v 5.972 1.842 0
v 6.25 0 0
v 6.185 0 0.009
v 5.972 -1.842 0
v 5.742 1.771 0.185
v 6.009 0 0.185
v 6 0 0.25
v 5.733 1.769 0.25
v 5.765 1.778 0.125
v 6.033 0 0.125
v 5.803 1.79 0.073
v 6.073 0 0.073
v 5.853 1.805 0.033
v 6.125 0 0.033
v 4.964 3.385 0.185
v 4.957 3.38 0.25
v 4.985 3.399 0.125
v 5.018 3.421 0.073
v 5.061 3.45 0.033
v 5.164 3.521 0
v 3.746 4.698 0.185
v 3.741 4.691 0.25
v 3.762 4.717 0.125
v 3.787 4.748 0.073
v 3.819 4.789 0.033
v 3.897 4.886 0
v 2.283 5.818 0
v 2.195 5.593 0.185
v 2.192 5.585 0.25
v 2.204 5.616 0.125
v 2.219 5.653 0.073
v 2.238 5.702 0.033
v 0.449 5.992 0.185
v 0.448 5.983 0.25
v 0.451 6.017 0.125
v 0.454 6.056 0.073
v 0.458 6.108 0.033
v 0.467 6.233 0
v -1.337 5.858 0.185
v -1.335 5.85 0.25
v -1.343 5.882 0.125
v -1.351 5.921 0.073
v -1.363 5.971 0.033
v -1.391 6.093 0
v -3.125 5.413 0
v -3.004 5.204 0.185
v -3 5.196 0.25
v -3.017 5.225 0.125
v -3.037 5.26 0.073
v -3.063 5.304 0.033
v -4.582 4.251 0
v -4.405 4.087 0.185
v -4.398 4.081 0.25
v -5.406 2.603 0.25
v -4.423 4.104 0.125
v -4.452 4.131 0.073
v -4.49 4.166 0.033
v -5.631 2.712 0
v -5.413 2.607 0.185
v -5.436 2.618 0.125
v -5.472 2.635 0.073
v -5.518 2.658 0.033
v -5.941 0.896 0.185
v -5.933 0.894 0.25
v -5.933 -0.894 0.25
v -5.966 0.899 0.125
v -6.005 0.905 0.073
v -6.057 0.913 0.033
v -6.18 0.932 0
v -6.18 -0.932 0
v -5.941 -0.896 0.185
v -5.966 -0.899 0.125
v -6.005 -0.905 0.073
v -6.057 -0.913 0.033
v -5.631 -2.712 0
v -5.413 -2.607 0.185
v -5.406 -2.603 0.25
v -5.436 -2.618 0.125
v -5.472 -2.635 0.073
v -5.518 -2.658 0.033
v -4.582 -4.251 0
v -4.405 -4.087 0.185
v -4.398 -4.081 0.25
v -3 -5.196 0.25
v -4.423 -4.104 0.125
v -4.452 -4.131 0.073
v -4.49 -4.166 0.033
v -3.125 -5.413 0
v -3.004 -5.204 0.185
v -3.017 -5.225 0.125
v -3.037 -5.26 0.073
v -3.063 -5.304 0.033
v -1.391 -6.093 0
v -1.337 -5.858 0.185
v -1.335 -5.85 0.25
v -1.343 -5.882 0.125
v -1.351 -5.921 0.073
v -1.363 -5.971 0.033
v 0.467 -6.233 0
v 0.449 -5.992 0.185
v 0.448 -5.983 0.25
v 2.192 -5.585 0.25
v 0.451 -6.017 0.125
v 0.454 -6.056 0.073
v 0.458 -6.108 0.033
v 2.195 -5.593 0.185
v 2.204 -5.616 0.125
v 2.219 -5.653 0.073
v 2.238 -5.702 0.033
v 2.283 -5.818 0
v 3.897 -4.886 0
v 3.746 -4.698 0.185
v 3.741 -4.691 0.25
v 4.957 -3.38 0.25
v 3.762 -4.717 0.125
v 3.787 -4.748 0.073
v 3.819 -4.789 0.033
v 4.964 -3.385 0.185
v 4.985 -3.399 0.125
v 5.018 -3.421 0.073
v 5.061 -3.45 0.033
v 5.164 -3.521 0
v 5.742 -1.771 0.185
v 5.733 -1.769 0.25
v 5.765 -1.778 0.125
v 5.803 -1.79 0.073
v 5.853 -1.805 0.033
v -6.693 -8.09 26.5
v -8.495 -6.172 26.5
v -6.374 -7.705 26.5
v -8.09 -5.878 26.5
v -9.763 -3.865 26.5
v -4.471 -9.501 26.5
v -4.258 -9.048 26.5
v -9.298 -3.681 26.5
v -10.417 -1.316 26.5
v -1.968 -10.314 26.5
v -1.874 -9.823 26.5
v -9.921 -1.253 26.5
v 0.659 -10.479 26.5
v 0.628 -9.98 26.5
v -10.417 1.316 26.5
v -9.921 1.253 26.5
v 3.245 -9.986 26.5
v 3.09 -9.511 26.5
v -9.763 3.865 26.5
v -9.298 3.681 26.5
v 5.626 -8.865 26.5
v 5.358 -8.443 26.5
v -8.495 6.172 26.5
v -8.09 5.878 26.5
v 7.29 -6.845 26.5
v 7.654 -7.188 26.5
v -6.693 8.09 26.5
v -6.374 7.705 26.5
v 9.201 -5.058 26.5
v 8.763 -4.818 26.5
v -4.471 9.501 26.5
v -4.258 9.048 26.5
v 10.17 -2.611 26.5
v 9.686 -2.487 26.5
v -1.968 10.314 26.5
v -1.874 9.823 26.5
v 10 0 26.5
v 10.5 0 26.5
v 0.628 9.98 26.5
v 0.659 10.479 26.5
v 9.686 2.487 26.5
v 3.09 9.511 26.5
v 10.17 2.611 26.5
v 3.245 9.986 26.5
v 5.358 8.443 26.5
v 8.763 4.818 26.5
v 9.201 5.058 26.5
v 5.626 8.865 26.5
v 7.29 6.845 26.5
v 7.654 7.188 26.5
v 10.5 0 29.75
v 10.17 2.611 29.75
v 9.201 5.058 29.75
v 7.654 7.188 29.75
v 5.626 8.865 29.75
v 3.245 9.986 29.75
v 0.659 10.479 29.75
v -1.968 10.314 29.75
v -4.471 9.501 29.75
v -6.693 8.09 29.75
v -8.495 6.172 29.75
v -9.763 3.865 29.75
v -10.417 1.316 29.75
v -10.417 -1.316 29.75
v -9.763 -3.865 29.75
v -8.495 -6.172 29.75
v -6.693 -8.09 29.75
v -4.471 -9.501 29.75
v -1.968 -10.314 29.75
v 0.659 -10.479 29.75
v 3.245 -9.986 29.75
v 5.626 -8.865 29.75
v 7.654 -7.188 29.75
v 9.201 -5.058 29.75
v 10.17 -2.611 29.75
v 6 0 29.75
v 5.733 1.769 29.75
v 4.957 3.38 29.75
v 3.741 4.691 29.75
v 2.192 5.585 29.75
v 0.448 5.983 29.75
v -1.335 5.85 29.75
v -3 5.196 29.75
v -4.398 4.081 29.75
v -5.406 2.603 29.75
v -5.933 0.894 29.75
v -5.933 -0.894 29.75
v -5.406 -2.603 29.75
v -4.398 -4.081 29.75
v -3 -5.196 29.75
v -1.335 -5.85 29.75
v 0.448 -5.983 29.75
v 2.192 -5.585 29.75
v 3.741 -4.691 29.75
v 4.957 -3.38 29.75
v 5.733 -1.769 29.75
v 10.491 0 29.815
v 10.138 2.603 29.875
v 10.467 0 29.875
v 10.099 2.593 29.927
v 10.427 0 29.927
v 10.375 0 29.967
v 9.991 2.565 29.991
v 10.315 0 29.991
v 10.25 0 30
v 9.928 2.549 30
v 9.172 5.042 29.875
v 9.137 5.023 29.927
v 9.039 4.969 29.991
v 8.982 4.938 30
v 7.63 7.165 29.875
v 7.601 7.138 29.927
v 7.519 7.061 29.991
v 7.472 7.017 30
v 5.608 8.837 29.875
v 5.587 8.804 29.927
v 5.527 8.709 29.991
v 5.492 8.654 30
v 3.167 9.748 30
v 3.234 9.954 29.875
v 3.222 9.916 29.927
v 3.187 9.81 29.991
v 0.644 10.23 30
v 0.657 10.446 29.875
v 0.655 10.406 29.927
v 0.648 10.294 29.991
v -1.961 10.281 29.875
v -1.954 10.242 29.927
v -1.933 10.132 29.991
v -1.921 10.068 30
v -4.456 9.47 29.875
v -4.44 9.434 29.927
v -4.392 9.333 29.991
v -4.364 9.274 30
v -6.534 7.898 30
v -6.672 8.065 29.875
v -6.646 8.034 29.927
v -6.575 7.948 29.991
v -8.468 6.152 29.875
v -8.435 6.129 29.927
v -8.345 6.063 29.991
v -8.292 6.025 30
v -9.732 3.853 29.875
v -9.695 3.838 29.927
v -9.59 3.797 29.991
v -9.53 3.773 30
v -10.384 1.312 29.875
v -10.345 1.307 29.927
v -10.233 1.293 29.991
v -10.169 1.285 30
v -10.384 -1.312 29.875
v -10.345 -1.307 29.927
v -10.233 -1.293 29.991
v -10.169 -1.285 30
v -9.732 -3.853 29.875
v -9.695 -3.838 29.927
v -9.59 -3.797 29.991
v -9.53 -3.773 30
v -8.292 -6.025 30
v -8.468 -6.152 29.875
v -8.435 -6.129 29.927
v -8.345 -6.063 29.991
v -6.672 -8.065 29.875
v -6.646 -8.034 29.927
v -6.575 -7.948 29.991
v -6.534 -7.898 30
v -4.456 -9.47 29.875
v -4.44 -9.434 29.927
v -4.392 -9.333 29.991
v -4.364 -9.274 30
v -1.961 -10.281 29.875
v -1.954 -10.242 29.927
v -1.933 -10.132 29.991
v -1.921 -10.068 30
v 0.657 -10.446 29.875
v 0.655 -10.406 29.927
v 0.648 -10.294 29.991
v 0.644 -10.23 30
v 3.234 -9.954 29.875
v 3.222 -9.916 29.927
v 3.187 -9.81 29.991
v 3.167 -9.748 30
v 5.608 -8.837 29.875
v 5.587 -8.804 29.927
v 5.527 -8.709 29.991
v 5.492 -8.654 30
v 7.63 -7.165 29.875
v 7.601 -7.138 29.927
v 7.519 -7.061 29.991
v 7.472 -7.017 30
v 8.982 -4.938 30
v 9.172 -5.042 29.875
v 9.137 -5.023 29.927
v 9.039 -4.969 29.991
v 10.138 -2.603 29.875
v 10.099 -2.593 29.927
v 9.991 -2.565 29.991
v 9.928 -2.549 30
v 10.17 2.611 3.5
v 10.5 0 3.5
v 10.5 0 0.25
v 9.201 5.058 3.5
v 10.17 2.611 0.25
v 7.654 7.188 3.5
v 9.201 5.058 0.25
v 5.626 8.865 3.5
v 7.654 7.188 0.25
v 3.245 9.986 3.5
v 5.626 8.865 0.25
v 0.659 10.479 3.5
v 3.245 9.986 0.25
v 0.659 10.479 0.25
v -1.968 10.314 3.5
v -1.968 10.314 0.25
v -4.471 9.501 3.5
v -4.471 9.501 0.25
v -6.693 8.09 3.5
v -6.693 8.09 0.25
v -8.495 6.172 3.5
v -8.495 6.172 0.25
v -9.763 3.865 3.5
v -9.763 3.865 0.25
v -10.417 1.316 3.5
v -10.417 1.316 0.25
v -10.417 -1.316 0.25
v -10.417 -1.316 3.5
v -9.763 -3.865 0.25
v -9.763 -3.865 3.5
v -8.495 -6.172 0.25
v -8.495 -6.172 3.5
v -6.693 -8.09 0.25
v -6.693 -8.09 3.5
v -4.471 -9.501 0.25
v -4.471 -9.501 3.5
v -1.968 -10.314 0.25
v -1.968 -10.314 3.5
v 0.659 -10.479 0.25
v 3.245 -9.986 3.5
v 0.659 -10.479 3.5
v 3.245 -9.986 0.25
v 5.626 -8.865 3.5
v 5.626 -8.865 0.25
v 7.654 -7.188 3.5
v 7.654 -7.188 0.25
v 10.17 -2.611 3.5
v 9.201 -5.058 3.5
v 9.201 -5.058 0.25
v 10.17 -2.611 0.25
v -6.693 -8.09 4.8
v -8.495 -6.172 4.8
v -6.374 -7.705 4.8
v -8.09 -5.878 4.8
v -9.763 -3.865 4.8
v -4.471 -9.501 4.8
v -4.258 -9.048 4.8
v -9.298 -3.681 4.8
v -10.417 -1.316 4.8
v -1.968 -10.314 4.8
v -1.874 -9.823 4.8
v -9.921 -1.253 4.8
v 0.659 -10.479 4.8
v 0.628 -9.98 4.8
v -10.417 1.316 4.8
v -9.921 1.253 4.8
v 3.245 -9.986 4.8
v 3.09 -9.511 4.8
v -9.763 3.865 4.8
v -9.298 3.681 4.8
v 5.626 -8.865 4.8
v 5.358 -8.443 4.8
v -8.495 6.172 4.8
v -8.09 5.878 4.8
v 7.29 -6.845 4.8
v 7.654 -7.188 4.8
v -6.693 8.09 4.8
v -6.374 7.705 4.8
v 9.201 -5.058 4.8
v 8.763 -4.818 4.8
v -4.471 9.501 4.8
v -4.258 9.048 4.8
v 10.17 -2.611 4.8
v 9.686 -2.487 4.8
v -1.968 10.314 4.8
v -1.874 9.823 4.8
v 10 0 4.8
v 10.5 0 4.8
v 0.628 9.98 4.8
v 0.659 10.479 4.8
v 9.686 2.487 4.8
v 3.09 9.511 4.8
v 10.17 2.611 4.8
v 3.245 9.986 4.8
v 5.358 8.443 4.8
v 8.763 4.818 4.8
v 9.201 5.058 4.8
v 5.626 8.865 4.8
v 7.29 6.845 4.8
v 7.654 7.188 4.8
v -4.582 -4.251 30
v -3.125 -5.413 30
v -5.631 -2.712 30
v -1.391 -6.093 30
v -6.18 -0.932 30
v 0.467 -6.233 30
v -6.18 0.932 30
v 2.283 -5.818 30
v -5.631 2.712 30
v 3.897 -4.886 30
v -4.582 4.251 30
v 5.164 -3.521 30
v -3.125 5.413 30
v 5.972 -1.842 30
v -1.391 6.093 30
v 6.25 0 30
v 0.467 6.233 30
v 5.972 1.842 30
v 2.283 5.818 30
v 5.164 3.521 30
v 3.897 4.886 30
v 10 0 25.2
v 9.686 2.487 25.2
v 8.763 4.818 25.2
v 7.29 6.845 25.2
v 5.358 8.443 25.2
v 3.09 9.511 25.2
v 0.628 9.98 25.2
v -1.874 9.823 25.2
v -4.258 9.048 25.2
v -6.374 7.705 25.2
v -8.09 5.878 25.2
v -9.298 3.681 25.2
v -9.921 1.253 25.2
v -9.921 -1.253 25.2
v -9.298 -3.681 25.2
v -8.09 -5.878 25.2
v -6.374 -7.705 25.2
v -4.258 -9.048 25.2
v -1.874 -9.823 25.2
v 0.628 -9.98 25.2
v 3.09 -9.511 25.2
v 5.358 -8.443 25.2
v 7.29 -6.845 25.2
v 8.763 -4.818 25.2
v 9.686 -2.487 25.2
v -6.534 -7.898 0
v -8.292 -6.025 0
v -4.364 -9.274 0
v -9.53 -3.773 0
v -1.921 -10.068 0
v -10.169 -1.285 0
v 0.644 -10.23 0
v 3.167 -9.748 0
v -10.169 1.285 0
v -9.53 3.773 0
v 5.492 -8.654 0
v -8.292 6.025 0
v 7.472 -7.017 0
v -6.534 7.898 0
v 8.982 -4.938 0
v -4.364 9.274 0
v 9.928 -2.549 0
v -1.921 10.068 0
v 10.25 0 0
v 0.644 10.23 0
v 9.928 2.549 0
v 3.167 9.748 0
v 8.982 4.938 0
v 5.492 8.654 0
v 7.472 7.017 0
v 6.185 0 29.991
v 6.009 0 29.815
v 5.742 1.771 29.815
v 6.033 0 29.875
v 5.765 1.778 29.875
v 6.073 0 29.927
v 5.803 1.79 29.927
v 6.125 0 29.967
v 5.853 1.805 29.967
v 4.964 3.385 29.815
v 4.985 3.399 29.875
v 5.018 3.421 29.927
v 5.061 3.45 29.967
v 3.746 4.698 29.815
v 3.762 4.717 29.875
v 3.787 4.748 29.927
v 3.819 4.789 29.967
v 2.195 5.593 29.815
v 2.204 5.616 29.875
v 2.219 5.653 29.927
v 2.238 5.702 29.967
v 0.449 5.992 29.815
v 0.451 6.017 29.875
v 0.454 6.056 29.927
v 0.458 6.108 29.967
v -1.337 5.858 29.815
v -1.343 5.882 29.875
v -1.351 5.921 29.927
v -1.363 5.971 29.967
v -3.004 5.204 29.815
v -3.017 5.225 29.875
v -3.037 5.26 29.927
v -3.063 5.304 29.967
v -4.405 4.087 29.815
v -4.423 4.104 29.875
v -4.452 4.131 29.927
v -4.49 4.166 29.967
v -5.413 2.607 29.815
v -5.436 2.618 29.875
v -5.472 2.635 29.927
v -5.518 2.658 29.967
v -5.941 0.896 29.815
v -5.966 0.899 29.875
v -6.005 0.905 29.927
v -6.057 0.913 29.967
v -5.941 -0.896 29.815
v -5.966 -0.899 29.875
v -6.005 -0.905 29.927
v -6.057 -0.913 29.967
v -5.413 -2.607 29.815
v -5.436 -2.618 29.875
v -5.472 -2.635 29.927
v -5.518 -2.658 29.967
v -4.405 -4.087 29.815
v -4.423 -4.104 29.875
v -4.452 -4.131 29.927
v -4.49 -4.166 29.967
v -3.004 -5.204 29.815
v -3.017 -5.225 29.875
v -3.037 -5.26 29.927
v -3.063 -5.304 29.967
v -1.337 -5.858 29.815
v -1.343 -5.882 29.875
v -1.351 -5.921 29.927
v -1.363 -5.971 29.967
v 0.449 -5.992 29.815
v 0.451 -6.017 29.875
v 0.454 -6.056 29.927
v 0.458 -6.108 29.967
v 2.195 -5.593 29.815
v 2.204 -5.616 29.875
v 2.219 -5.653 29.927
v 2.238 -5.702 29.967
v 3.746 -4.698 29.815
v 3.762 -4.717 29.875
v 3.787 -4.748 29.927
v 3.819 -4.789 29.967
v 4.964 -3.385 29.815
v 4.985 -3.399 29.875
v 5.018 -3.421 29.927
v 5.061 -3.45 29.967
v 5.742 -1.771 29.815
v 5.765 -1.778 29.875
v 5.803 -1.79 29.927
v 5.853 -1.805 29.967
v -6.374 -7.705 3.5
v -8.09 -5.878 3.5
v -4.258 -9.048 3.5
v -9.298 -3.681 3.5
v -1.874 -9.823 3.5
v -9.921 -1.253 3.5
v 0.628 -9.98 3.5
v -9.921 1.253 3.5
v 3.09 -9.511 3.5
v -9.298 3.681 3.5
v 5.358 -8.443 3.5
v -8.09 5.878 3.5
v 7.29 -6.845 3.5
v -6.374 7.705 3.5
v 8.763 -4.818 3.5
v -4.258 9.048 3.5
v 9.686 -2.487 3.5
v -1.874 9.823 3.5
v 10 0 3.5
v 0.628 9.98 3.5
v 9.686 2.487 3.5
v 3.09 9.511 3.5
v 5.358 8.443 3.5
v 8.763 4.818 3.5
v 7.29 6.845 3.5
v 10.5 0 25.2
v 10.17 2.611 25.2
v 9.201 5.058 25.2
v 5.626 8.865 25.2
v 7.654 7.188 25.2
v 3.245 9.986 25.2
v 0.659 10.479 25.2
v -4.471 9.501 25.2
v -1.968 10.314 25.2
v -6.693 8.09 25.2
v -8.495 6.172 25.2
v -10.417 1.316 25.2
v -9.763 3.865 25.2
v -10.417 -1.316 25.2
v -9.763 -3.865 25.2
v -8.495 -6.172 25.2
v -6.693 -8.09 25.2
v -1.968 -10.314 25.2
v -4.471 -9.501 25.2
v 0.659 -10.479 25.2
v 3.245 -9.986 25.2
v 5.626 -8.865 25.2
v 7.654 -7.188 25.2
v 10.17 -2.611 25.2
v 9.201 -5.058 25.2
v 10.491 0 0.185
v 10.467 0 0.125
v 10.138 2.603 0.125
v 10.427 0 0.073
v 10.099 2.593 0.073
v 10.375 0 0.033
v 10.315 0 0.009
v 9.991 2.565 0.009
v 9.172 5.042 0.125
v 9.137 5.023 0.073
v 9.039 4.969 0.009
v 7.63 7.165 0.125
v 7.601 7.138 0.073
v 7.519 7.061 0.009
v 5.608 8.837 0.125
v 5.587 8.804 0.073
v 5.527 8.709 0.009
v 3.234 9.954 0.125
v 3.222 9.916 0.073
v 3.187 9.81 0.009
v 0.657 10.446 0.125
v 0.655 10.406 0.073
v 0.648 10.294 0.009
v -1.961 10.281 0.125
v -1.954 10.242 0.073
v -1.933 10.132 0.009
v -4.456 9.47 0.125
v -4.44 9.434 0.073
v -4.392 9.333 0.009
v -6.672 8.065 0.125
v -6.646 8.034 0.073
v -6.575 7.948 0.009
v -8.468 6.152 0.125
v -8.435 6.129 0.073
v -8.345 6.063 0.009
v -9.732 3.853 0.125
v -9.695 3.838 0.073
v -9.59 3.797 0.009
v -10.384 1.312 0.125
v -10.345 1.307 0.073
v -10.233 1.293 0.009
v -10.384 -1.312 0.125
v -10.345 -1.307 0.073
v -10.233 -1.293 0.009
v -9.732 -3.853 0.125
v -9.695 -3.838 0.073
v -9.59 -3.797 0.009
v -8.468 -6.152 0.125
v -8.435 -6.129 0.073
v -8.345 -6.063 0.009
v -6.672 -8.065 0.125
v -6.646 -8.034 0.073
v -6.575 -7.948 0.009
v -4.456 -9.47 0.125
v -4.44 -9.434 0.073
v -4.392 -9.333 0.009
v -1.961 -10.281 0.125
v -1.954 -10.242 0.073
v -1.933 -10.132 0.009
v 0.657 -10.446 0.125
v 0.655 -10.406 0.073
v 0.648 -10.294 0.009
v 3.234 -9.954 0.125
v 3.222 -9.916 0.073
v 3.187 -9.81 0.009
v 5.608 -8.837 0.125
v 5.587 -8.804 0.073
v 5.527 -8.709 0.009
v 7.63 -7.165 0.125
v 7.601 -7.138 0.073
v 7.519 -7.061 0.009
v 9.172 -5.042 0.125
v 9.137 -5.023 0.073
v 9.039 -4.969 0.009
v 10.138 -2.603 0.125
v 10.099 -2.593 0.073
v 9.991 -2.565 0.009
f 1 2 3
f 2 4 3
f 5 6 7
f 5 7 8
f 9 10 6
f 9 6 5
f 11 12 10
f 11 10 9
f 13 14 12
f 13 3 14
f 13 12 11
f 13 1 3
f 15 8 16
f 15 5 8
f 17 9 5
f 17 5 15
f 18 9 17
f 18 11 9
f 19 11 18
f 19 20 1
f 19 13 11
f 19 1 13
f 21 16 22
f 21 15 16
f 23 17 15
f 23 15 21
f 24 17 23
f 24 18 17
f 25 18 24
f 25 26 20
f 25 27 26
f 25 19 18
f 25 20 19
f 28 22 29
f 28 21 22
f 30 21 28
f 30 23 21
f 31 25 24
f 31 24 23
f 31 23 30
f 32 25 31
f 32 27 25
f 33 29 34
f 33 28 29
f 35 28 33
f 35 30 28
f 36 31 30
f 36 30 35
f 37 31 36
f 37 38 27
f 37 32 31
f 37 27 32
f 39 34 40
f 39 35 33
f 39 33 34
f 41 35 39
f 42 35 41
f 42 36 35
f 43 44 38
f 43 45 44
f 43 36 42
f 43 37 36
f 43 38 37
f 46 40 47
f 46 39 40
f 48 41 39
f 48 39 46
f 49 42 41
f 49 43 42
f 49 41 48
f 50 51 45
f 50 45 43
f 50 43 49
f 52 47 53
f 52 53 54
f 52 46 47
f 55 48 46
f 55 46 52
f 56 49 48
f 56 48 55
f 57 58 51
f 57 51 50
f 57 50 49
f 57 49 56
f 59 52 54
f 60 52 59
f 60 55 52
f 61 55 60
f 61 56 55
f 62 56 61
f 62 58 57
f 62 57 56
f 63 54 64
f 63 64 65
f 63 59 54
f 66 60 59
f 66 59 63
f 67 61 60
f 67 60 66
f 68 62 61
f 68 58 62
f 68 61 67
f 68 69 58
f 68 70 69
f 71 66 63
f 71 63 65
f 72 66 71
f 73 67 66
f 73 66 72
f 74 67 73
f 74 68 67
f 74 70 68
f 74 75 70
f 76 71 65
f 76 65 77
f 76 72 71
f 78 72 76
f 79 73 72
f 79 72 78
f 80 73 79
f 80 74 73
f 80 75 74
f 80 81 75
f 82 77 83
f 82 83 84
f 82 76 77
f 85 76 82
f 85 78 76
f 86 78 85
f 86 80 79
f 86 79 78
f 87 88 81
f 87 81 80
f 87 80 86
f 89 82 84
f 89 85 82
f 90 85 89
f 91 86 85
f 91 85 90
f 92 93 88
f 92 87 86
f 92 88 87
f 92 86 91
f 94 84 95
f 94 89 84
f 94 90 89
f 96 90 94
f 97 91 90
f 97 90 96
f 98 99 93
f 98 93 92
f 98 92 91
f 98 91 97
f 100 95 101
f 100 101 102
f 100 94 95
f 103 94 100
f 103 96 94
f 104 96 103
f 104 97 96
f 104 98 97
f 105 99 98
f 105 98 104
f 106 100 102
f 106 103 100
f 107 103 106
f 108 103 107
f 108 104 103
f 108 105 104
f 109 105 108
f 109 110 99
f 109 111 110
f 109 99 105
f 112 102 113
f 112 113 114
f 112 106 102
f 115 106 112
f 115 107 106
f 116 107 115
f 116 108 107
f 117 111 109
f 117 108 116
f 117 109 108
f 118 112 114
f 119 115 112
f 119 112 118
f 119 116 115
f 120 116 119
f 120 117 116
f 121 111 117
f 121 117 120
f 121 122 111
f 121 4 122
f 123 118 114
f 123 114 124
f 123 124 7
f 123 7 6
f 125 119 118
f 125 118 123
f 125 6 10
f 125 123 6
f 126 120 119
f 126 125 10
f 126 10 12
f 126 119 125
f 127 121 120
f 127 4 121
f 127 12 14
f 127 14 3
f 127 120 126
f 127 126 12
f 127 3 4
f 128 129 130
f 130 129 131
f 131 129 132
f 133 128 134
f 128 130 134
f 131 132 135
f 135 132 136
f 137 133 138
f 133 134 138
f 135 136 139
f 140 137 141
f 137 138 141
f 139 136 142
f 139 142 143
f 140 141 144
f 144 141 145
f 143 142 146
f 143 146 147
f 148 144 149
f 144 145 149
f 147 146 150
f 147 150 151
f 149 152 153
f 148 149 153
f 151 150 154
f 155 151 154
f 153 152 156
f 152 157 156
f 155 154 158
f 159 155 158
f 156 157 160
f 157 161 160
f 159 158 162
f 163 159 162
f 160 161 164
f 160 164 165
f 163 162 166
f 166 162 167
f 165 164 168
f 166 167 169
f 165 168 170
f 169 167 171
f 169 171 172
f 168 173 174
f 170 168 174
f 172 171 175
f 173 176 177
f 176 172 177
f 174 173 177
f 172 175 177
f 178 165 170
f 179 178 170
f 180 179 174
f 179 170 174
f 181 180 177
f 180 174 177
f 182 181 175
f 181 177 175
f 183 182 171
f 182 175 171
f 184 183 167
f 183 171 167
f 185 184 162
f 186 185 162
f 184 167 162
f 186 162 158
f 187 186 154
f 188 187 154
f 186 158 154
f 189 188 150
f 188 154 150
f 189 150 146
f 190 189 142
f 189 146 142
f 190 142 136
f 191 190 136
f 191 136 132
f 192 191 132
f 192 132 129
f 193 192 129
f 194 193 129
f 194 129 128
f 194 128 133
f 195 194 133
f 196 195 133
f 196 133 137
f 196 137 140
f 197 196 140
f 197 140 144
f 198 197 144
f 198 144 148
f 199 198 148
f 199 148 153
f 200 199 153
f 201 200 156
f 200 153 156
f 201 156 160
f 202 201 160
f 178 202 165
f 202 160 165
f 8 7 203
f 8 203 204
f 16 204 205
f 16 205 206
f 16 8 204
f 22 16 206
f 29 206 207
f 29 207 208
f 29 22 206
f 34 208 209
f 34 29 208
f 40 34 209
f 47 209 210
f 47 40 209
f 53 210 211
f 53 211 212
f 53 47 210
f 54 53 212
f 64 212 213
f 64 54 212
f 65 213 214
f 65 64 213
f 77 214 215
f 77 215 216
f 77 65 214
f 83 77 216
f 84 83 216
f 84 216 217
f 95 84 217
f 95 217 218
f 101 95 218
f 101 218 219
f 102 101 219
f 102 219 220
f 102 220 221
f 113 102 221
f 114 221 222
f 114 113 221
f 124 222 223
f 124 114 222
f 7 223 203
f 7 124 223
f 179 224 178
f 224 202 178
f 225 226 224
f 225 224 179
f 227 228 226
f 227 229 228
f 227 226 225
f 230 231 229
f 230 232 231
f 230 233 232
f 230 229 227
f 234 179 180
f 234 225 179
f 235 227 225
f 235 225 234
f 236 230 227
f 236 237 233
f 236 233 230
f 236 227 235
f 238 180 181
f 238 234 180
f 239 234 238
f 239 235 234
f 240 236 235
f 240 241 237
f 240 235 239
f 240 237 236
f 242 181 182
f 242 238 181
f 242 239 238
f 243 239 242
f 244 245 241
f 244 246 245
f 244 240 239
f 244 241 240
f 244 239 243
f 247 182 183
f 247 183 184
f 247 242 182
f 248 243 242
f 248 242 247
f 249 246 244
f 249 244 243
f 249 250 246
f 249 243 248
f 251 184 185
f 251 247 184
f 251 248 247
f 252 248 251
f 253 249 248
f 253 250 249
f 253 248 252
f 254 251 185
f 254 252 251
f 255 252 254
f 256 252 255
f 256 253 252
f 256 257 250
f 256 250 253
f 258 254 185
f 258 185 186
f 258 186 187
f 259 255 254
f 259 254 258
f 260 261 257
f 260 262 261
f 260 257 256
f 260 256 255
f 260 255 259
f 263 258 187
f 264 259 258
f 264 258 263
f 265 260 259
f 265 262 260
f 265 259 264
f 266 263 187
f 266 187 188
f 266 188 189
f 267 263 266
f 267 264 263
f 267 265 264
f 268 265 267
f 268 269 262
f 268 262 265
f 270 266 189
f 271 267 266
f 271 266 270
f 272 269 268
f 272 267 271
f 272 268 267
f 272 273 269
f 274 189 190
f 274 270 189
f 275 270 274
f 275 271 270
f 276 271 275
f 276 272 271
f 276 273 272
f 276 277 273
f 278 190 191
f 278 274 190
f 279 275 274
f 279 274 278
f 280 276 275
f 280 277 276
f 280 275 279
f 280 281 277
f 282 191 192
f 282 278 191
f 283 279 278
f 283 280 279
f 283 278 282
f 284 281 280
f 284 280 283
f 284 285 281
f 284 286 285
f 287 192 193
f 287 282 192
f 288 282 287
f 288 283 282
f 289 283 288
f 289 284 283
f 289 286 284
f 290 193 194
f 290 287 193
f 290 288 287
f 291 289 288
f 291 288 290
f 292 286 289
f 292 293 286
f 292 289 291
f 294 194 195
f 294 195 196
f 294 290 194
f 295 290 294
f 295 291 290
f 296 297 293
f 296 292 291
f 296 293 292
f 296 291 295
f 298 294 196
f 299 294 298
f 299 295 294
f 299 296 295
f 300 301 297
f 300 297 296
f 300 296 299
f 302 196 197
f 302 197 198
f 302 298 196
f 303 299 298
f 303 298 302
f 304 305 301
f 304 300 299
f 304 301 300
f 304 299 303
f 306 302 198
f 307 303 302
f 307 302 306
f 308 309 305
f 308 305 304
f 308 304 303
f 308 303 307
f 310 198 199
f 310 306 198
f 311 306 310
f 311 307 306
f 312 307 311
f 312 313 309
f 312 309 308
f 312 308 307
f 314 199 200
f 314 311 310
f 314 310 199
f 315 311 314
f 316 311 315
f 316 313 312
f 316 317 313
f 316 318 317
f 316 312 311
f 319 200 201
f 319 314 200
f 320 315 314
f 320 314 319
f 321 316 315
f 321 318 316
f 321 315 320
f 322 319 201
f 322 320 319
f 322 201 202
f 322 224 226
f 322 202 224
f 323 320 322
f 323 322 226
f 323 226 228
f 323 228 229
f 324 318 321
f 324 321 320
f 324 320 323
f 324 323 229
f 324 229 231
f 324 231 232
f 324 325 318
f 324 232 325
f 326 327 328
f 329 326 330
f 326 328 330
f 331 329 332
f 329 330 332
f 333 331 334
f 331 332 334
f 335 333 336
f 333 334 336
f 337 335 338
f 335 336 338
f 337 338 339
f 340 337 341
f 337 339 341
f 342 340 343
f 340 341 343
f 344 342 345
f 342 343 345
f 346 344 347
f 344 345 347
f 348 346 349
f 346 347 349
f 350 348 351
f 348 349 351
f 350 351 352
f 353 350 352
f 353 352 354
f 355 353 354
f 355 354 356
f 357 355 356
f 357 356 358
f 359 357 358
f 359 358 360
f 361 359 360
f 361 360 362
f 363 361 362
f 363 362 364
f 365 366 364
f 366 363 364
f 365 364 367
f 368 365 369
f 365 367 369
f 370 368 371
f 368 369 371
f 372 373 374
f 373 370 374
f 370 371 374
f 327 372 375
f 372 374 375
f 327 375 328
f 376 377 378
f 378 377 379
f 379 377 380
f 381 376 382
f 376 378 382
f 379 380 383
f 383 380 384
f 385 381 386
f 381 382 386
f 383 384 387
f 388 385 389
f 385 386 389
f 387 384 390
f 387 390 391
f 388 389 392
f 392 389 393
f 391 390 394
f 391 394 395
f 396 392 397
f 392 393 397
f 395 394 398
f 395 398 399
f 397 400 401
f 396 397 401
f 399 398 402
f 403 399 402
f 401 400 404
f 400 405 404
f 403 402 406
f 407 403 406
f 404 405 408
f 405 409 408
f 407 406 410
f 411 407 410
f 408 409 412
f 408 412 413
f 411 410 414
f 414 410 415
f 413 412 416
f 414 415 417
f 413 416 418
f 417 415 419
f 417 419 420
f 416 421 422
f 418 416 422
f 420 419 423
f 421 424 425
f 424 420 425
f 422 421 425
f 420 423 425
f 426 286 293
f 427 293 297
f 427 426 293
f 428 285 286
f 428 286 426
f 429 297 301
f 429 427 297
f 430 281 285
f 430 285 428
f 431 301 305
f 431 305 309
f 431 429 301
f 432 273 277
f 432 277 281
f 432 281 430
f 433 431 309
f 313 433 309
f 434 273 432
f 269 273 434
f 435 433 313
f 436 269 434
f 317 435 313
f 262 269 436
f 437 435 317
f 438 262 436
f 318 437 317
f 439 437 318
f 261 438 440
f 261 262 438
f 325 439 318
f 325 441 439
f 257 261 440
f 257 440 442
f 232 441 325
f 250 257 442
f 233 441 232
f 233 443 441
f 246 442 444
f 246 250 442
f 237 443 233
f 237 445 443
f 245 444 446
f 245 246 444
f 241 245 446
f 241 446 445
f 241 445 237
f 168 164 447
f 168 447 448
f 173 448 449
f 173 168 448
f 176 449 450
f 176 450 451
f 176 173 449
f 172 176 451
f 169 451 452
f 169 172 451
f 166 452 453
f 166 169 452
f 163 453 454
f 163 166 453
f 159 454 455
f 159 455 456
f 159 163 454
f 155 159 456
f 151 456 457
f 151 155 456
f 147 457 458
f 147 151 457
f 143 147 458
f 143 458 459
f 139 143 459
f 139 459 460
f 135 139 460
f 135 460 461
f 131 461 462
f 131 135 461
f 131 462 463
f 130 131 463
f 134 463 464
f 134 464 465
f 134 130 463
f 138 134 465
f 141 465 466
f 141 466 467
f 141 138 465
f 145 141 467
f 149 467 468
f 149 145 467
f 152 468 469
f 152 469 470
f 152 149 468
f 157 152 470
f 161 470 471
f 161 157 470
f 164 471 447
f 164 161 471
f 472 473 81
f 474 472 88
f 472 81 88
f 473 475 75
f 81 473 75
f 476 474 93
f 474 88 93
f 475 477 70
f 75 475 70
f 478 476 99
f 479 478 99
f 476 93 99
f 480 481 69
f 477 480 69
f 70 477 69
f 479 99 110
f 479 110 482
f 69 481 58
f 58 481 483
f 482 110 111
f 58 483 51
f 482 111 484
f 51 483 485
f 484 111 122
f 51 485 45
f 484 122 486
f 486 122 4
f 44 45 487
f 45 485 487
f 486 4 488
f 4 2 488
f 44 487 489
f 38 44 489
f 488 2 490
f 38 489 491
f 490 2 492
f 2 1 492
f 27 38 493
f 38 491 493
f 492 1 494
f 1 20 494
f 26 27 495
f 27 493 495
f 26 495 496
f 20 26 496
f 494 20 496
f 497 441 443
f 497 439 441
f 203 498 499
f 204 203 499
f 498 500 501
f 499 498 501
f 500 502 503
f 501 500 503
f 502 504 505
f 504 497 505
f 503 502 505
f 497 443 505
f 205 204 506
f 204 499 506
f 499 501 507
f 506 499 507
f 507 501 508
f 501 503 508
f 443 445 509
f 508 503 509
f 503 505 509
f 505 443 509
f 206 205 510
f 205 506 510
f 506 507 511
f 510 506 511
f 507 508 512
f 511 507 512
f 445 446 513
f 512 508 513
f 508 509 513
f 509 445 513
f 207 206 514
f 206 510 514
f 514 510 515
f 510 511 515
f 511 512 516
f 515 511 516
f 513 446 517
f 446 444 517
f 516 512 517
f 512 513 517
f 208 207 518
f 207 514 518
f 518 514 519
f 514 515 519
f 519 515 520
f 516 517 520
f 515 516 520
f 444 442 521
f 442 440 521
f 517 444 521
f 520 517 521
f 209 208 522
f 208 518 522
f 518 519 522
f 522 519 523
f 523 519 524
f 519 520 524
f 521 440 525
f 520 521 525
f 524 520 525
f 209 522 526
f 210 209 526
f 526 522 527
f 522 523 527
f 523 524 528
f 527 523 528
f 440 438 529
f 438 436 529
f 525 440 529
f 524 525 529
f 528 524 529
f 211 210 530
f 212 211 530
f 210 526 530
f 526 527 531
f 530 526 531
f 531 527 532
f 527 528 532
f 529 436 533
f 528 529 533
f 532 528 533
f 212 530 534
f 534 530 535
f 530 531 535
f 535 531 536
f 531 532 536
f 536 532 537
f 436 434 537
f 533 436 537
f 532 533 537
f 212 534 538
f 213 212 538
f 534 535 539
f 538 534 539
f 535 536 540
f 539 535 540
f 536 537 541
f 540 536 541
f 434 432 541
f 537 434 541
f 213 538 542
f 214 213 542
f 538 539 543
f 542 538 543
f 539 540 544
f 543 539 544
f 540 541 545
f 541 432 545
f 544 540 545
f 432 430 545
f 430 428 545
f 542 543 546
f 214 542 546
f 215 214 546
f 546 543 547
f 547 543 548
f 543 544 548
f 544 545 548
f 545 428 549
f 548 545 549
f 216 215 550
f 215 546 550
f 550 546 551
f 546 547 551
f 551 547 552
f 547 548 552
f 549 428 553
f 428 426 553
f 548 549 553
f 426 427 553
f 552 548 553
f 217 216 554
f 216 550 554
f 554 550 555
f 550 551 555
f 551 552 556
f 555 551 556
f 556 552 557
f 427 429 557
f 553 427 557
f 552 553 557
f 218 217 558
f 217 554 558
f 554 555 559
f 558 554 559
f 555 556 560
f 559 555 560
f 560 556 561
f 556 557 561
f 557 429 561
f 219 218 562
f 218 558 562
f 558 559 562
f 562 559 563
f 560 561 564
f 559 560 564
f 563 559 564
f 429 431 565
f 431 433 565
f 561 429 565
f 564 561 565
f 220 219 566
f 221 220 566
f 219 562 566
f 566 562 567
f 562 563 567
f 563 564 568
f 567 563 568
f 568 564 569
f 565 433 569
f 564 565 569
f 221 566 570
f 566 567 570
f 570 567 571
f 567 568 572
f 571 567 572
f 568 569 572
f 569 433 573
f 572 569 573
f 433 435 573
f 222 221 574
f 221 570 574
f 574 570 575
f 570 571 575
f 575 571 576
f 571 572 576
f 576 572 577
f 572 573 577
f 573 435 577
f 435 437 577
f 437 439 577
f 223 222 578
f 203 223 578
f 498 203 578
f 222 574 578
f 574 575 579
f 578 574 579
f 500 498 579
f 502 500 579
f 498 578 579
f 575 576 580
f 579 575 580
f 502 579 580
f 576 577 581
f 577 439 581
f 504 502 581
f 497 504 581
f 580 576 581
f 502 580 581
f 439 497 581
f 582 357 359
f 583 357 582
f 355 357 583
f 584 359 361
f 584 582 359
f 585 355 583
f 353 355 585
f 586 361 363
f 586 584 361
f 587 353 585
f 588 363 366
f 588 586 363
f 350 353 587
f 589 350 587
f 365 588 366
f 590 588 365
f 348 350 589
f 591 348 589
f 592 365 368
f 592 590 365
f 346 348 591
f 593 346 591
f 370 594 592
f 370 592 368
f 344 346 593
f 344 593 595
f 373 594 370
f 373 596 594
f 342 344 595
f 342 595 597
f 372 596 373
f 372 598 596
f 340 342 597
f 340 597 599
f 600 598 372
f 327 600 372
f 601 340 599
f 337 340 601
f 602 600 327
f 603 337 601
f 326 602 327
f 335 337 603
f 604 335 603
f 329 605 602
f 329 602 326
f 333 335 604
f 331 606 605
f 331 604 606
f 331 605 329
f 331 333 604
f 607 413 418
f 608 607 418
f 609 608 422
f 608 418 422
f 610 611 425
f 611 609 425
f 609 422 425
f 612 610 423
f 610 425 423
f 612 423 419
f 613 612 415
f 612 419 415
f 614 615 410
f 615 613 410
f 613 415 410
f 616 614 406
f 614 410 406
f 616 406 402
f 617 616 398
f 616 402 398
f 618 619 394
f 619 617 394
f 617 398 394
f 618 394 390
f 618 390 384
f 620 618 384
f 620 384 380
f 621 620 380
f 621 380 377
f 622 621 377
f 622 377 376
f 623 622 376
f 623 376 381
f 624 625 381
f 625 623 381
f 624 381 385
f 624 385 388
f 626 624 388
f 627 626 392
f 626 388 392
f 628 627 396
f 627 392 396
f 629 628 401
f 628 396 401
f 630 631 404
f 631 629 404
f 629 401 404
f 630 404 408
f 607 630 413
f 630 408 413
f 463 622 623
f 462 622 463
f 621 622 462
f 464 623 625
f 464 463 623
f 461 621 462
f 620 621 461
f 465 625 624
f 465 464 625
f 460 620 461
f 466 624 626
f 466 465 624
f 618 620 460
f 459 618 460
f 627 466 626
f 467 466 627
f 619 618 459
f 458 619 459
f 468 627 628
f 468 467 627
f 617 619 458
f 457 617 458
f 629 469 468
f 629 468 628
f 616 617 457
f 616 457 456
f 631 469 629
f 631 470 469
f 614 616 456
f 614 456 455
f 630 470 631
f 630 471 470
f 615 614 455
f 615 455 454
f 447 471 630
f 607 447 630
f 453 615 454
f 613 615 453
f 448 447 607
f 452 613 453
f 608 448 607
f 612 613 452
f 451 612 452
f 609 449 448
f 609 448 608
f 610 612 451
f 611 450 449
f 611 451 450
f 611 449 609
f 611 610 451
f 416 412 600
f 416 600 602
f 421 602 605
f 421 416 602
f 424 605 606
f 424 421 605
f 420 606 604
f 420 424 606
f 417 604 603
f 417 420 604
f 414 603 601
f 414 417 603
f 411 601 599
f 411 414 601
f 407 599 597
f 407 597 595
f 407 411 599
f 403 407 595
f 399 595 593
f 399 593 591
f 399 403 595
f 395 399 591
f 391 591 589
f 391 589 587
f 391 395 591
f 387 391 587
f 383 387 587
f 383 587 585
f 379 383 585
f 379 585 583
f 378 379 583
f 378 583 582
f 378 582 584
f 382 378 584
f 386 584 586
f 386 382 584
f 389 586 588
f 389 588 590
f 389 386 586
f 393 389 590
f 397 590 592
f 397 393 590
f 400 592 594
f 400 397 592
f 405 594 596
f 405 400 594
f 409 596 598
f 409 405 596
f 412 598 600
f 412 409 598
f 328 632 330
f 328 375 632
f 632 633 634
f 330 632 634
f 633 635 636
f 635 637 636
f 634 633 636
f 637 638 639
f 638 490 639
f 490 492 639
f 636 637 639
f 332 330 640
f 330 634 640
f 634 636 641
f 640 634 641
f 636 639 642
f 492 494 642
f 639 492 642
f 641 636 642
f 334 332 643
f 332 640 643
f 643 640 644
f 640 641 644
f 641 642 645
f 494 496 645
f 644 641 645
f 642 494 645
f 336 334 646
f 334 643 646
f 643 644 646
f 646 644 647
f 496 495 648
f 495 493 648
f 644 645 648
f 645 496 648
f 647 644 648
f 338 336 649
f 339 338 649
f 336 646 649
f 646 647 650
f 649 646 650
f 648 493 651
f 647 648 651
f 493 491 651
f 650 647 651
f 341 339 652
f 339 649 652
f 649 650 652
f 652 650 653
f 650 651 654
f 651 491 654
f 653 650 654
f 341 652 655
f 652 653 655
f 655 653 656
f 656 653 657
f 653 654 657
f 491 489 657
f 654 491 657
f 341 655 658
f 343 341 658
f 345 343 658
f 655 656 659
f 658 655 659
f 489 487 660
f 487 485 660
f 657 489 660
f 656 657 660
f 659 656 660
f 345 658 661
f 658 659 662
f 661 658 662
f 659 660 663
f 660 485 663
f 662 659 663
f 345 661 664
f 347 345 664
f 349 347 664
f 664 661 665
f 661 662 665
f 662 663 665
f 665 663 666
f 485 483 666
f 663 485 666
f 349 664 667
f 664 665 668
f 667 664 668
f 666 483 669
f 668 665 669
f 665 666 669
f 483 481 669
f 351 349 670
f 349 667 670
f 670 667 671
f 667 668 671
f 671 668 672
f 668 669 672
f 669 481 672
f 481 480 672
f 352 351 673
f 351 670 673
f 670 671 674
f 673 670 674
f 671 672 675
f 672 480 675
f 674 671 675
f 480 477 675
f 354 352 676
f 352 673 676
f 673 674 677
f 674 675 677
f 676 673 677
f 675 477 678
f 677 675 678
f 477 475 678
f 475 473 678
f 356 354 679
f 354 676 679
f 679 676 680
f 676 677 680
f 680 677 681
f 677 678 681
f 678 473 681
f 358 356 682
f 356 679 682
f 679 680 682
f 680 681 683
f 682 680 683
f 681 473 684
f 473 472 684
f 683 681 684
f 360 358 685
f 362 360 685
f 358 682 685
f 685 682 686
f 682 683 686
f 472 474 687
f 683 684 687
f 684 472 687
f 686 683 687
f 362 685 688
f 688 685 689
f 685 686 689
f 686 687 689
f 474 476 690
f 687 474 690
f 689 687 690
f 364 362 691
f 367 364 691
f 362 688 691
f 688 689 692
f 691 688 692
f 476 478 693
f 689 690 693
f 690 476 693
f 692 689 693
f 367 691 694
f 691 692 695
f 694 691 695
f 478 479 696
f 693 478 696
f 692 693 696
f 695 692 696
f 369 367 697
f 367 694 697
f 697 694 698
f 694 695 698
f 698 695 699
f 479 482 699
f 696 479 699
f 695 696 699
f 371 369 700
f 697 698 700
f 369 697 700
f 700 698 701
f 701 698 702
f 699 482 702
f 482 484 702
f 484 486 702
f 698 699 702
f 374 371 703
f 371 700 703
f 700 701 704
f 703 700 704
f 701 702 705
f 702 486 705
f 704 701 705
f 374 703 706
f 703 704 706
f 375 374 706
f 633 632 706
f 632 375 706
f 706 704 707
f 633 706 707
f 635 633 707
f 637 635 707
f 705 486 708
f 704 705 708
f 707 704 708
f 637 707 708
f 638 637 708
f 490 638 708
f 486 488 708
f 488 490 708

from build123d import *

# Parameters (mm, degrees)
F0_R     = 10.5
F0_R_2   = 6
F1_DEPTH = 30
F2_R     = 0.25
F4_START = -3.5
F3_R     = 16
F3_R_2   = 10
F4_DEPTH = 1.3
F5_START = -25.2
F5_DEPTH = 1.3


with BuildPart() as f1:
    # F0 (on Top) → F1 (new body)
    with BuildSketch(Plane.XY):
        Circle(F0_R)
        Circle(F0_R_2, mode=Mode.SUBTRACT)
    extrude(amount=F1_DEPTH)

    # F2
    f2_edges = [f1.edges().sort_by_distance(p)[0] for p in [
        (-10.5, 0, 30),
        (-6, 0, 30),
        (-10.5, 0, 0),
        (-6, 0, 0),
    ]]
    fillet(f2_edges, radius=F2_R)

    # F3 (on face) → F4 (cut)
    with BuildSketch(Plane.XY.offset(30).offset(F4_START)):
        Circle(F3_R)
        Circle(F3_R_2, mode=Mode.SUBTRACT)
    extrude(amount=-F4_DEPTH, mode=Mode.SUBTRACT)

    # F3 (on face) → F5 (cut)
    with BuildSketch(Plane.XY.offset(30).offset(F5_START)):
        Circle(F3_R)
        Circle(F3_R_2, mode=Mode.SUBTRACT)
    extrude(amount=-F5_DEPTH, mode=Mode.SUBTRACT)


solid = f1.part
